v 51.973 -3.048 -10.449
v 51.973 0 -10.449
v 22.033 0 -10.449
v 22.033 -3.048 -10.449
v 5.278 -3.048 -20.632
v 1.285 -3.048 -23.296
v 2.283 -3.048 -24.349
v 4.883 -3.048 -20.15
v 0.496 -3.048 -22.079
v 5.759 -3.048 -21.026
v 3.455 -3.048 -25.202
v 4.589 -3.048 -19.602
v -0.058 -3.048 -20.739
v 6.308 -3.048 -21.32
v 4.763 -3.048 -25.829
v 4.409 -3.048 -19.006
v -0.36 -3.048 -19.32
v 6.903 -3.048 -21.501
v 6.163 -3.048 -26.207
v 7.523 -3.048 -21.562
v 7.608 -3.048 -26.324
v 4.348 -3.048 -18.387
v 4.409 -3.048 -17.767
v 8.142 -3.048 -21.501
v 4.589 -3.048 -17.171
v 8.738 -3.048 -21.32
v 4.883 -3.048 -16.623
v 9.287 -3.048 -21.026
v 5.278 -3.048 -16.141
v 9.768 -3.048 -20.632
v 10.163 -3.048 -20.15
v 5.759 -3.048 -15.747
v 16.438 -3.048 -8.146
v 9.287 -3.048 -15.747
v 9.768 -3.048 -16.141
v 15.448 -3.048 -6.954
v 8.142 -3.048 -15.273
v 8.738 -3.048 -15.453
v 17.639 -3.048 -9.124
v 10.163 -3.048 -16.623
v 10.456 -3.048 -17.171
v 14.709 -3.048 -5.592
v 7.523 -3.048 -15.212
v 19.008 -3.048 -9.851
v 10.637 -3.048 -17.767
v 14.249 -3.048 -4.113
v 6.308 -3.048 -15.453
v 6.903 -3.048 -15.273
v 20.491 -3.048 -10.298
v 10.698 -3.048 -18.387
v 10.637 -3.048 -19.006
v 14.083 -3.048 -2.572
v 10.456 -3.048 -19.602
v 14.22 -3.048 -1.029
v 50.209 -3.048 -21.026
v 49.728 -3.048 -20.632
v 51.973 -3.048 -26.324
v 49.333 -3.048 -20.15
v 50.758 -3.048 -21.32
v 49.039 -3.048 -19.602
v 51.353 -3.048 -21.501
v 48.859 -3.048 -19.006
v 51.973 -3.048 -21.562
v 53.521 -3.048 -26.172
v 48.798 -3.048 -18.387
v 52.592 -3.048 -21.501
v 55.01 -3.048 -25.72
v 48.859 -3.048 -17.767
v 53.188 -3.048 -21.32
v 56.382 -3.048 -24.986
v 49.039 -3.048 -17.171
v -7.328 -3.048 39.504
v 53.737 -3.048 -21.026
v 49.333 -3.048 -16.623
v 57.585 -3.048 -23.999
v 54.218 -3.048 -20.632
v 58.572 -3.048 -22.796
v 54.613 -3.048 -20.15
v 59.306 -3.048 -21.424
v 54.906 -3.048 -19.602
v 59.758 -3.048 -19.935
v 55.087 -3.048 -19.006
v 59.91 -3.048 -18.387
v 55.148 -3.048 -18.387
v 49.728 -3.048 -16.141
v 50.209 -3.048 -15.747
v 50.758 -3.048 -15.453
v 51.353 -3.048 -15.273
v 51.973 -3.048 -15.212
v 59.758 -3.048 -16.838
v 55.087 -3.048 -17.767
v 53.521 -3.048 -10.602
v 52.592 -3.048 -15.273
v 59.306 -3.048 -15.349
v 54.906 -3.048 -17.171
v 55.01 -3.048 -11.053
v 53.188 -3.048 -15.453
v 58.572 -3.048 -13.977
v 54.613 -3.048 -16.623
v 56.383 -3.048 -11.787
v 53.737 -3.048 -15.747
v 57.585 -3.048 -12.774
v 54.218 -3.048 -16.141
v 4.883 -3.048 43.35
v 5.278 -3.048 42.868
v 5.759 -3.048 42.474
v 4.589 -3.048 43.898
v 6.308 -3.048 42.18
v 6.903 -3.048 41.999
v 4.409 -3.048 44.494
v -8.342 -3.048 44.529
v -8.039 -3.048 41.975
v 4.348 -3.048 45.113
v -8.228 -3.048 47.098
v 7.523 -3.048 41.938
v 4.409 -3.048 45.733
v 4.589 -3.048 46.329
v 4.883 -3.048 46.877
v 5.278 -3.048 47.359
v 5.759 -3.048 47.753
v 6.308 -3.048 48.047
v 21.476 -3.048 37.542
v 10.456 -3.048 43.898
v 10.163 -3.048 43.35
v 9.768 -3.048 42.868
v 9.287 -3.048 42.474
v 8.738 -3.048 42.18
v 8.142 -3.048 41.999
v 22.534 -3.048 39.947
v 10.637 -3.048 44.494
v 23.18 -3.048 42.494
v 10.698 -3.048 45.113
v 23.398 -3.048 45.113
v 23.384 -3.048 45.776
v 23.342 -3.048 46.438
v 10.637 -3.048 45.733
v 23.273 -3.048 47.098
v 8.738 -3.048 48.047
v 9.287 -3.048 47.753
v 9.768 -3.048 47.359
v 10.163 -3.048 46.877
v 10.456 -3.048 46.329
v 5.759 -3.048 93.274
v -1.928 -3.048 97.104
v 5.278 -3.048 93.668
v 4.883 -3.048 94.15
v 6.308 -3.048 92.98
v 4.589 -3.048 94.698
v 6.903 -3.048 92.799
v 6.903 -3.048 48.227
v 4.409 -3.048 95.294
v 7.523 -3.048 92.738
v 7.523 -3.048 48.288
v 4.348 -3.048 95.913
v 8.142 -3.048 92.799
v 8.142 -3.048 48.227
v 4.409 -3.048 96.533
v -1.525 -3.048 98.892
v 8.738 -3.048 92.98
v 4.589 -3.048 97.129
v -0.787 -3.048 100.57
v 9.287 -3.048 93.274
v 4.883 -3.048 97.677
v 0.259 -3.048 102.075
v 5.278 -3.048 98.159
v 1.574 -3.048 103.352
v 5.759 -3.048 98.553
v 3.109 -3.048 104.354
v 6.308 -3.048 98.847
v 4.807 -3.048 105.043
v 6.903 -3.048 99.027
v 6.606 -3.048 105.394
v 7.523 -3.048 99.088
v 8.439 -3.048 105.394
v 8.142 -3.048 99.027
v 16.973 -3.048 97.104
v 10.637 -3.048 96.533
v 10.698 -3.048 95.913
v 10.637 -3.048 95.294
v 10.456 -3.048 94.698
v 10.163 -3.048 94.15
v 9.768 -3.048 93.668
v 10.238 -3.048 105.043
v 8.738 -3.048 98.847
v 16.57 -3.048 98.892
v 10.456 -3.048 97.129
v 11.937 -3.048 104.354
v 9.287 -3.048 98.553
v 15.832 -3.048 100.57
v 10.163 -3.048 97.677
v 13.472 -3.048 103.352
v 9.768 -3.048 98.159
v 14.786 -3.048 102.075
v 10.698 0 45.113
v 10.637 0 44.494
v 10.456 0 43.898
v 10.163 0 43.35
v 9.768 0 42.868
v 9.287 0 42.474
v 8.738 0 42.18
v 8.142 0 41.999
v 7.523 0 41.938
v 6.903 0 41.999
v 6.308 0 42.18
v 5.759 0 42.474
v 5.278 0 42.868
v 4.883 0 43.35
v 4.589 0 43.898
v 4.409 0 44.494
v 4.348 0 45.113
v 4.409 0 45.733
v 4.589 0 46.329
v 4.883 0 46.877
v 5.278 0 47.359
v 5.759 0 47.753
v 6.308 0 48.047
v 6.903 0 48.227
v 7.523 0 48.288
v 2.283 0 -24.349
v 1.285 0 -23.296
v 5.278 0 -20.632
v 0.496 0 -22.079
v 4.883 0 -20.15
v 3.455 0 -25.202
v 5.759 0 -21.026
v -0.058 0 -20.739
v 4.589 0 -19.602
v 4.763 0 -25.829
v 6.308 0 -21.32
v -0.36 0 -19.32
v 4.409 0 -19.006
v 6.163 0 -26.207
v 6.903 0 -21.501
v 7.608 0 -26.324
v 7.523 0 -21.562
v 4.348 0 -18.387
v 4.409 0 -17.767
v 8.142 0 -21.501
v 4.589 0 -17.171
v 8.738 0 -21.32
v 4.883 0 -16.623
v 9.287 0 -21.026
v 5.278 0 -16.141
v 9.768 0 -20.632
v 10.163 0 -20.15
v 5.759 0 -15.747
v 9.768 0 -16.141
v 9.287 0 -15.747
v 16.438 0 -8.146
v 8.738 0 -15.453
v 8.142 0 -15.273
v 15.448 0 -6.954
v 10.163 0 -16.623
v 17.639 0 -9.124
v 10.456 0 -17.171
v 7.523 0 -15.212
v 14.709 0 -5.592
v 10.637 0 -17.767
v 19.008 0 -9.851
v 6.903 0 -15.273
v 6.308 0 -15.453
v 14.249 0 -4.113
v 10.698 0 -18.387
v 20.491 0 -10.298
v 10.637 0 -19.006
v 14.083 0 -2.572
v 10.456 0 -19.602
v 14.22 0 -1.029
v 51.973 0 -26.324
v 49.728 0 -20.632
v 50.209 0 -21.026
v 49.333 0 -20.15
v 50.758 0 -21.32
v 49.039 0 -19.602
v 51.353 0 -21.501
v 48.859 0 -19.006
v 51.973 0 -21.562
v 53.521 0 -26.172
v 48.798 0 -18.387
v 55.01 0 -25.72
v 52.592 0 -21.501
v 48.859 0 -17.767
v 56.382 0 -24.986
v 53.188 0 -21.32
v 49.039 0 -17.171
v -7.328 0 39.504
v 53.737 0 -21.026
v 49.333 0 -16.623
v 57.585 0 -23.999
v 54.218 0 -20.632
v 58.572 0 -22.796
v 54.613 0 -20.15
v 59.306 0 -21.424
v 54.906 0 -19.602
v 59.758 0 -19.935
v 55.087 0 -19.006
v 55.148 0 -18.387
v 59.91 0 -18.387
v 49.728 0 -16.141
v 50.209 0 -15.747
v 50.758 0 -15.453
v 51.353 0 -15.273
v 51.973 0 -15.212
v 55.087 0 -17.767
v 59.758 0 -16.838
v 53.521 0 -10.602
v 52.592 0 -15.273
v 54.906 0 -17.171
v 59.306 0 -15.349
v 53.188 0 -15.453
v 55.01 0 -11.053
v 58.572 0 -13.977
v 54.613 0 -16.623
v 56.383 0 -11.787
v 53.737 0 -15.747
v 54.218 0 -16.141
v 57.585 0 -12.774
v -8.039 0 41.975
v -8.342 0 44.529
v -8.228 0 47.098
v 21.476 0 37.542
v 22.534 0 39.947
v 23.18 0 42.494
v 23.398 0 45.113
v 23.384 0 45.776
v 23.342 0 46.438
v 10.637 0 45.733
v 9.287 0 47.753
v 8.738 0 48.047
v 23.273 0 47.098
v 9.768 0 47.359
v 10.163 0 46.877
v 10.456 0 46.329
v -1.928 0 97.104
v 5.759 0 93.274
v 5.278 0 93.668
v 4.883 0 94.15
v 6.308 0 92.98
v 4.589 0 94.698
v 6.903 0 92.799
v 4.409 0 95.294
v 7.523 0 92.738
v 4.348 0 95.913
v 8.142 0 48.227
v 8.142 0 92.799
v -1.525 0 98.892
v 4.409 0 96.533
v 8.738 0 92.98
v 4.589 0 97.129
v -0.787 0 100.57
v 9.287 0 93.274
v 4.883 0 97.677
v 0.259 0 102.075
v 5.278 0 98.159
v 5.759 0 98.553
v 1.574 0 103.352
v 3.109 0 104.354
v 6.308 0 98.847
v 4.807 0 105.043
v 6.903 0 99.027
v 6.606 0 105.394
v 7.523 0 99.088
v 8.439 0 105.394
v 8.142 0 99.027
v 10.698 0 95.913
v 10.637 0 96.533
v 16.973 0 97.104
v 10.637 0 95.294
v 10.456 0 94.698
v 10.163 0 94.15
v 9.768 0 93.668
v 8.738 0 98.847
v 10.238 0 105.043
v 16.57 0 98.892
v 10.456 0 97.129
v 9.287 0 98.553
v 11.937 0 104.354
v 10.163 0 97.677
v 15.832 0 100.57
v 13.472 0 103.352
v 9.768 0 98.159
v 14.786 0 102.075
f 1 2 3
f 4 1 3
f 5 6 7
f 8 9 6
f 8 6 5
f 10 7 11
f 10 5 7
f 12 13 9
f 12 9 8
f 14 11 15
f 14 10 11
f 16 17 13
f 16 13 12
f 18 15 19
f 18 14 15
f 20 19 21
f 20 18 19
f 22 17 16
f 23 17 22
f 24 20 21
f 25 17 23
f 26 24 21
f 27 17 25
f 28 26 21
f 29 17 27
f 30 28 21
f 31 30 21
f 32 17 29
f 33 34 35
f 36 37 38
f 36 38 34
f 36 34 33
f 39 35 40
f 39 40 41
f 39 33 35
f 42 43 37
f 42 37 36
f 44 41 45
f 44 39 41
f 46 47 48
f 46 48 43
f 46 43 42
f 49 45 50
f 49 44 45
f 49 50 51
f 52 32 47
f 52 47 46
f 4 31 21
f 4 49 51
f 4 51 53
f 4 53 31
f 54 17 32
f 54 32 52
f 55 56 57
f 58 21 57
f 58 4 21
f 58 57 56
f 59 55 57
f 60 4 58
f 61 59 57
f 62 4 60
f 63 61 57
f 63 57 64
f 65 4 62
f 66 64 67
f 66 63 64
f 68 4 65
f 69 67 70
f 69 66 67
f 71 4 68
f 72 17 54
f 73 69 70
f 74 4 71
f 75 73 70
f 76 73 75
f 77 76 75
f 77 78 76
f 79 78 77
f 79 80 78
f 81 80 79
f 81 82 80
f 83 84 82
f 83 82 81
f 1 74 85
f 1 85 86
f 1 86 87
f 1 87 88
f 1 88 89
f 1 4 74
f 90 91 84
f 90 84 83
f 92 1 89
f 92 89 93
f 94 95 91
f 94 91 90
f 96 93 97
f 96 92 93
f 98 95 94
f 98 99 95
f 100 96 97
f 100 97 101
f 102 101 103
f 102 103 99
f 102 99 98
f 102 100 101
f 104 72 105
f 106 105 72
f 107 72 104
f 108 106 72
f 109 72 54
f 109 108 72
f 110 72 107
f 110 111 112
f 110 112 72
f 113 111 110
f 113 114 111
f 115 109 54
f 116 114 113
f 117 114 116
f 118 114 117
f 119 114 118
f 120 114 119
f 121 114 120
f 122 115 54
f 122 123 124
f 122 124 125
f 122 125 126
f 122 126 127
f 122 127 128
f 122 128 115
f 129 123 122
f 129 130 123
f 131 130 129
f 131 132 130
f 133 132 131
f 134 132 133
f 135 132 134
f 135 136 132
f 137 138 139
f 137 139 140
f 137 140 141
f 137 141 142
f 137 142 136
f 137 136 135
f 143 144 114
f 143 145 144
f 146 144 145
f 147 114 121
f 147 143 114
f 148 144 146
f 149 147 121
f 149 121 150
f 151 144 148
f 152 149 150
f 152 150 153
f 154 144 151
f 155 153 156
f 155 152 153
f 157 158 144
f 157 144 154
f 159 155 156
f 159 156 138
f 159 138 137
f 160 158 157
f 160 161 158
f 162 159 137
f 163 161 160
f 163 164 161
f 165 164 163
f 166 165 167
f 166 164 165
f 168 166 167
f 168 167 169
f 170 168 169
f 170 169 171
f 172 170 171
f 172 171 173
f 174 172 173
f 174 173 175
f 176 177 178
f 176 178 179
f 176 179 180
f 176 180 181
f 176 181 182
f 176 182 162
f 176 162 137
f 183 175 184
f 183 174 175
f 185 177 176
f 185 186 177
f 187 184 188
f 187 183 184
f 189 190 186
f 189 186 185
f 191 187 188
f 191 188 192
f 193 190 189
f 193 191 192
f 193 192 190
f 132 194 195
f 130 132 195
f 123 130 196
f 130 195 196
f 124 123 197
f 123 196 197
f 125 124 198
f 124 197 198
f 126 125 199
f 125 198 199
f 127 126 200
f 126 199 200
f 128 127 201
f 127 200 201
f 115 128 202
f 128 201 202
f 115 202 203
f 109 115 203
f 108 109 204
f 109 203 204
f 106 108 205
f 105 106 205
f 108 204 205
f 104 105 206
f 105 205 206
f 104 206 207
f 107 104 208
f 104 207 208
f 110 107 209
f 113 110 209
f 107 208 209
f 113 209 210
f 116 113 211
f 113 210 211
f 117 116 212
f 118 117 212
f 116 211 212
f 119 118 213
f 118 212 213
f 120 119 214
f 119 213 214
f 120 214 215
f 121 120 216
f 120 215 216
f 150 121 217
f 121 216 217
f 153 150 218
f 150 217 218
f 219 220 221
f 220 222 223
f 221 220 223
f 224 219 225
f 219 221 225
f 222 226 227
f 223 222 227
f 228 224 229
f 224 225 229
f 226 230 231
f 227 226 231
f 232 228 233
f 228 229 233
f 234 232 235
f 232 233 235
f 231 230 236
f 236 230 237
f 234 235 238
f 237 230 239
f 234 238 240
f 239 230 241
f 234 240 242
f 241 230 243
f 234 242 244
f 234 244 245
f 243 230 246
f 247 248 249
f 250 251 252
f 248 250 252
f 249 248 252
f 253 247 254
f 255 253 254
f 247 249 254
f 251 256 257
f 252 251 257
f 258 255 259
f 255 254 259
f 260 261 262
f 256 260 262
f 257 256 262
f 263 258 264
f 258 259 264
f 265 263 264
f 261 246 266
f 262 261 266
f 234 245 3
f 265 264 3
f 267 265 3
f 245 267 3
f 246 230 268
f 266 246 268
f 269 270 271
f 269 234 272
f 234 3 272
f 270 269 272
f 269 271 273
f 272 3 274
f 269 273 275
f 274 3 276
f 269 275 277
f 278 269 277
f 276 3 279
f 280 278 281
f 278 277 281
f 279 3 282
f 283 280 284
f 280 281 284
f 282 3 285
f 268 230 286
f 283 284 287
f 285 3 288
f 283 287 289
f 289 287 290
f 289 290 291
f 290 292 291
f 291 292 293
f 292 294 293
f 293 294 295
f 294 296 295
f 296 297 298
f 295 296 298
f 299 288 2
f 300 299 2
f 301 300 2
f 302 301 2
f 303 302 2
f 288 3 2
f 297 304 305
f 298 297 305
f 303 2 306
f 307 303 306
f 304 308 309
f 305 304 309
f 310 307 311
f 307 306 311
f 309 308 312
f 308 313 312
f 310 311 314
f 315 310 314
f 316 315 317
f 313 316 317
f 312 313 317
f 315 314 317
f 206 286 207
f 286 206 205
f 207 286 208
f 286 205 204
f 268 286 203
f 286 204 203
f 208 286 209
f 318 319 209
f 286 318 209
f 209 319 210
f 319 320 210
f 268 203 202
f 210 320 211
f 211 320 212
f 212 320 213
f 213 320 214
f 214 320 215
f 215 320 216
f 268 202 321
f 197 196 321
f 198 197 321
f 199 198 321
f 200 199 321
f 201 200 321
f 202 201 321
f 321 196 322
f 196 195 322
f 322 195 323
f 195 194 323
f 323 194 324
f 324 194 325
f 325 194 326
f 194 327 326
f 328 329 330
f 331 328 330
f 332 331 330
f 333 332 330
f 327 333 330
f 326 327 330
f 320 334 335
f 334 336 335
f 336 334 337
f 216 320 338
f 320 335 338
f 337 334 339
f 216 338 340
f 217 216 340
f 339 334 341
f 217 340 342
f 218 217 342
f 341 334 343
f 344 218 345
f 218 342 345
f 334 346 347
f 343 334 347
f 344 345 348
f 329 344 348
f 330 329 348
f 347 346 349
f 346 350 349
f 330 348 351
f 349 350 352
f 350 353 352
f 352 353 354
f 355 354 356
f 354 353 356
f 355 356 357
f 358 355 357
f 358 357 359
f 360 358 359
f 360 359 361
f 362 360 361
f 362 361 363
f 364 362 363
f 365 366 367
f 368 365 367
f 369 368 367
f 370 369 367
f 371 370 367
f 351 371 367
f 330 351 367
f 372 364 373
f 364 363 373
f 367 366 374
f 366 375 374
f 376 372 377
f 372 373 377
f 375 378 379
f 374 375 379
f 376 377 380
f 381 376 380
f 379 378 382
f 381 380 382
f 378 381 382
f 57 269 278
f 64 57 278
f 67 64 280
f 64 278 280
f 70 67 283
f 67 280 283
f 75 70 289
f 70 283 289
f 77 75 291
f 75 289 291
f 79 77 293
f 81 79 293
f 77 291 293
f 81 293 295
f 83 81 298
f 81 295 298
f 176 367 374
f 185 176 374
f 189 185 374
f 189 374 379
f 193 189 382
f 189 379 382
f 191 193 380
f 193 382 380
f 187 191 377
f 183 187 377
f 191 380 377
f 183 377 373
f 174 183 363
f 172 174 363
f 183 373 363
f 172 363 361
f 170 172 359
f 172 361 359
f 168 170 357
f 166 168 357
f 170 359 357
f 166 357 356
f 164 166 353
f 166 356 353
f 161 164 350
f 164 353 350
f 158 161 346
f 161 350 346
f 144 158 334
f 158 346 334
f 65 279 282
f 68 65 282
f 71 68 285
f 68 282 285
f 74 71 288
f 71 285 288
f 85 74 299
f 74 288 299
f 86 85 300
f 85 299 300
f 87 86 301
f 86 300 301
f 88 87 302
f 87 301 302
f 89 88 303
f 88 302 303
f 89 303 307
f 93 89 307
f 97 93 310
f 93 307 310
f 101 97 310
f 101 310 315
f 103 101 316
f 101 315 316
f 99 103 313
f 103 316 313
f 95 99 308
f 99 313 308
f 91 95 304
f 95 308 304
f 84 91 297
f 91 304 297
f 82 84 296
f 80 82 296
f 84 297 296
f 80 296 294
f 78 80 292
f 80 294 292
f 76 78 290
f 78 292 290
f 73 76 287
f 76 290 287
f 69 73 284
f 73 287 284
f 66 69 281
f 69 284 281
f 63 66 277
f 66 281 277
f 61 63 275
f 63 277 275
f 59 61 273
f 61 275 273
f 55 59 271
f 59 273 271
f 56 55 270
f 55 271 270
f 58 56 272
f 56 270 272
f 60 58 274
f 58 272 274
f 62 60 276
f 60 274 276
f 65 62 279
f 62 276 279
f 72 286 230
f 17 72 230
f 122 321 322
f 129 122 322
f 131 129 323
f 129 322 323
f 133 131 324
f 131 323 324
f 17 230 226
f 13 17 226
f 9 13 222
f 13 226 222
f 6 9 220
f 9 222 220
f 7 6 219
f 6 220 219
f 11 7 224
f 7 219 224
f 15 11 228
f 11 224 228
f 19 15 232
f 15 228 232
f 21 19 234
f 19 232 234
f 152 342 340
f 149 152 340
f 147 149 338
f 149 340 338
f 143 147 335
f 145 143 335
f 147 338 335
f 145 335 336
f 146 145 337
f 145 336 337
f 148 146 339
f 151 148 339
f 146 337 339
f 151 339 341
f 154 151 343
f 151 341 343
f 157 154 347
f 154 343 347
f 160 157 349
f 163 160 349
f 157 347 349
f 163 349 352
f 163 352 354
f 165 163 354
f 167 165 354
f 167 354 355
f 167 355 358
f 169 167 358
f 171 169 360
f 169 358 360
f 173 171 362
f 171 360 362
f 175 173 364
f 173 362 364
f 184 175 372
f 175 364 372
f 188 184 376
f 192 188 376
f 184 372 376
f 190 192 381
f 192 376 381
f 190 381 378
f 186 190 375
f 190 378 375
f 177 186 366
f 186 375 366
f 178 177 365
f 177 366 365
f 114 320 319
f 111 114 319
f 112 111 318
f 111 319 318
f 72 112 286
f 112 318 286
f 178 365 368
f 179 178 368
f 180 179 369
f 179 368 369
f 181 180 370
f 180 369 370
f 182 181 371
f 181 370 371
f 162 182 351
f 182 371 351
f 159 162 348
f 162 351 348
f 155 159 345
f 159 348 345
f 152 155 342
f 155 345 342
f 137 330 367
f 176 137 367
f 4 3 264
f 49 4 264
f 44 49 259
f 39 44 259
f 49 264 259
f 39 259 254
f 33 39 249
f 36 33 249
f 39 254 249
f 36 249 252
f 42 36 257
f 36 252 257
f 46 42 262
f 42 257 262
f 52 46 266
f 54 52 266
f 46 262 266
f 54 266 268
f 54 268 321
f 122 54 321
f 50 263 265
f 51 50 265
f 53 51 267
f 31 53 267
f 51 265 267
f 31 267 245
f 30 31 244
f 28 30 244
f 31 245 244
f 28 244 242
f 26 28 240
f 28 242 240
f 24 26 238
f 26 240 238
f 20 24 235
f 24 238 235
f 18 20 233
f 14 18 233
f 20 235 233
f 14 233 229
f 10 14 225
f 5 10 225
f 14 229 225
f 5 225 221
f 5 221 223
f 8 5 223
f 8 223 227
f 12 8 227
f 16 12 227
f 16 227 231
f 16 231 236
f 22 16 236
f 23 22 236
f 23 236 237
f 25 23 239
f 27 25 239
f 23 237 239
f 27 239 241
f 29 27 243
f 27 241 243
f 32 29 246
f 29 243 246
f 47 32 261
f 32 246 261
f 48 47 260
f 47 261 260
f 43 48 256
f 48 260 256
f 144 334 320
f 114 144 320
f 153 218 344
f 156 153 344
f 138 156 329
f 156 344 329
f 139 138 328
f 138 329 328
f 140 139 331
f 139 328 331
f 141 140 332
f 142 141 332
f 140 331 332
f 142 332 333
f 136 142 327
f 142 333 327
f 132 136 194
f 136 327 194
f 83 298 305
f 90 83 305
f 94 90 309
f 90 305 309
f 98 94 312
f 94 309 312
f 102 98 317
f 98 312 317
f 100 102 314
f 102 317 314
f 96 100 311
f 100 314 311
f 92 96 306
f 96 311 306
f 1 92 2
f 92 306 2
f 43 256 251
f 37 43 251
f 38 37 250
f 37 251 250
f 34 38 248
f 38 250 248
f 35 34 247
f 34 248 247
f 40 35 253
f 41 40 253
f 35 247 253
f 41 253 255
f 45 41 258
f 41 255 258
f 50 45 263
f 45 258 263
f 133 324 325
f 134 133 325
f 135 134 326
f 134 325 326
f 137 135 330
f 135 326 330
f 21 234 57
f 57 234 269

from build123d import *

# Parameters (mm, degrees)
F1_DEPTH = 3.048


with BuildPart() as f1:
    # F0 (on Front) → F1 (new body)
    with BuildSketch(Plane.XZ):
        with BuildLine():
            ThreePointArc((7.5227019244, -10.4490181237), (1.5890806412, -13.1143226875), (-0.3596819621, -19.3202903209))
            ThreePointArc((-0.3596819621, -19.3202903209), (2.2826274956, -24.3485250199), (7.6084325525, -26.3235551344))
            ThreePointArc((7.6084325525, -26.3235551344), (13.16559095, -23.9687855568), (15.4602019244, -18.3865181237))
            Line((15.4602019244, -18.3865181237), (10.6977019244, -18.3865181237))
            ThreePointArc((10.6977019244, -18.3865181237), (5.2776378942, -20.631582154), (7.5227019244, -15.2115181237))
            Line((7.5227019244, -15.2115181237), (7.5227019244, -10.4490181237))
        make_face()
        with BuildLine():
            Line((14.2200019541, -1.0290787363), (21.4755552782, 37.5415925289))
            ThreePointArc((21.4755552782, 37.5415925289), (15.6409493218, 31.4712795543), (7.5227019244, 29.2384818763))
            Line((7.5227019244, 29.2384818763), (7.5227019244, -10.4490181237))
            ThreePointArc((7.5227019244, -10.4490181237), (13.1353620001, -12.7738580481), (15.4602019244, -18.3865181237))
            Line((15.4602019244, -18.3865181237), (44.0352019244, -18.3865181237))
            ThreePointArc((44.0352019244, -18.3865181237), (46.3600418488, -12.7738580481), (51.9727019244, -10.4490181237))
            Line((51.9727019244, -10.4490181237), (22.0331668809, -10.4490181237))
            ThreePointArc((22.0331668809, -10.4490181237), (15.9139184745, -7.5742963259), (14.2200019541, -1.0290787363))
        make_face()
        with BuildLine():
            ThreePointArc((-1.9275910398, 97.1041068763), (0.3789519244, 89.6132865668), (7.5227019244, 86.3884818763))
            ThreePointArc((7.5227019244, 86.3884818763), (14.2578940152, 89.1782897855), (17.0477019244, 95.9134818763))
            ThreePointArc((17.0477019244, 95.9134818763), (17.0290068187, 96.5099651182), (16.9729948886, 97.1041068763))
            ThreePointArc((16.9729948886, 97.1041068763), (7.5227019244, 105.4384818763), (-1.9275910398, 97.1041068763))
        make_face()
        with BuildLine():
            ThreePointArc((10.6977019244, 95.9134818763), (9.7677659547, 93.668417846), (7.5227019244, 92.7384818763))
            ThreePointArc((7.5227019244, 92.7384818763), (5.2776378942, 98.1585459065), (10.6977019244, 95.9134818763))
        make_face(mode=Mode.SUBTRACT)
        with BuildLine():
            ThreePointArc((59.9102019244, -18.3865181237), (57.5853620001, -12.7738580481), (51.9727019244, -10.4490181237))
            ThreePointArc((51.9727019244, -10.4490181237), (46.3600418488, -12.7738580481), (44.0352019244, -18.3865181237))
            ThreePointArc((44.0352019244, -18.3865181237), (46.3600125617, -23.9991489122), (51.9726190879, -26.3240181233))
            ThreePointArc((51.9726190879, -26.3240181233), (57.5853327129, -23.9992074864), (59.9102019244, -18.3865181237))
        make_face()
        with BuildLine():
            ThreePointArc((55.1477019244, -18.3865181237), (51.9727019244, -21.5615181237), (48.7977019244, -18.3865181237))
            ThreePointArc((48.7977019244, -18.3865181237), (51.9727019244, -15.2115181237), (55.1477019244, -18.3865181237))
        make_face(mode=Mode.SUBTRACT)
        with BuildLine():
            ThreePointArc((23.2731901981, 47.0978568763), (18.0230274402, 57.0197318763), (7.5227019244, 60.9884818763))
            Line((7.5227019244, 60.9884818763), (7.5227019244, 48.2884818763))
            ThreePointArc((7.5227019244, 48.2884818763), (9.7677659547, 47.3585459065), (10.6977019244, 45.1134818763))
            ThreePointArc((10.6977019244, 45.1134818763), (9.7677659547, 42.868417846), (7.5227019244, 41.9384818763))
            Line((7.5227019244, 41.9384818763), (7.5227019244, 29.2384818763))
            ThreePointArc((7.5227019244, 29.2384818763), (15.6409493218, 31.4712795543), (21.4755552782, 37.5415925289))
            Line((21.4755552782, 37.5415925289), (23.2731901981, 47.0978568763))
        make_face()
        with BuildLine():
            ThreePointArc((23.3977019244, 45.1134818763), (23.3665434148, 46.1076206129), (23.2731901981, 47.0978568763))
            Line((23.2731901981, 47.0978568763), (21.4755552782, 37.5415925289))
            ThreePointArc((21.4755552782, 37.5415925289), (22.9096634827, 41.2074558901), (23.3977019244, 45.1134818763))
        make_face()
        with BuildLine():
            ThreePointArc((17.0477019244, 95.9134818763), (14.2578940152, 89.1782897855), (7.5227019244, 86.3884818763))
            Line((7.5227019244, 86.3884818763), (7.5227019244, 60.9884818763))
            ThreePointArc((7.5227019244, 60.9884818763), (18.0230274402, 57.0197318763), (23.2731901981, 47.0978568763))
            Line((23.2731901981, 47.0978568763), (16.9729948886, 97.1041068763))
            ThreePointArc((16.9729948886, 97.1041068763), (17.0290068187, 96.5099651182), (17.0477019244, 95.9134818763))
        make_face()
        with BuildLine():
            ThreePointArc((15.4602019244, -18.3865181237), (13.1353620001, -12.7738580481), (7.5227019244, -10.4490181237))
            Line((7.5227019244, -10.4490181237), (7.5227019244, -15.2115181237))
            ThreePointArc((7.5227019244, -15.2115181237), (9.7677659547, -16.1414540935), (10.6977019244, -18.3865181237))
            Line((10.6977019244, -18.3865181237), (15.4602019244, -18.3865181237))
        make_face()
        with BuildLine():
            ThreePointArc((15.4602019244, -18.3865181237), (13.16559095, -23.9687855568), (7.6084325525, -26.3235551344))
            Line((7.6084325525, -26.3235551344), (51.9726190879, -26.3240181233))
            ThreePointArc((51.9726190879, -26.3240181233), (46.3600125617, -23.9991489122), (44.0352019244, -18.3865181237))
            Line((44.0352019244, -18.3865181237), (15.4602019244, -18.3865181237))
        make_face()
        with BuildLine():
            Line((7.5227019244, 48.2884818763), (7.5227019244, 60.9884818763))
            ThreePointArc((7.5227019244, 60.9884818763), (-2.9776235914, 57.0197318763), (-8.2277863493, 47.0978568763))
            Line((-8.2277863493, 47.0978568763), (-7.3281904539, 39.5039702604))
            ThreePointArc((-7.3281904539, 39.5039702604), (-1.5040535308, 32.0546415391), (7.5227019244, 29.2384818763))
            Line((7.5227019244, 29.2384818763), (7.5227019244, 41.9384818763))
            ThreePointArc((7.5227019244, 41.9384818763), (4.3477019244, 45.1134818763), (7.5227019244, 48.2884818763))
        make_face()
        with BuildLine():
            Line((7.5227019244, 60.9884818763), (7.5227019244, 86.3884818763))
            ThreePointArc((7.5227019244, 86.3884818763), (0.3789519244, 89.6132865668), (-1.9275910398, 97.1041068763))
            Line((-1.9275910398, 97.1041068763), (-8.2277863493, 47.0978568763))
            ThreePointArc((-8.2277863493, 47.0978568763), (-2.9776235914, 57.0197318763), (7.5227019244, 60.9884818763))
        make_face()
        with BuildLine():
            ThreePointArc((7.5227019244, 29.2384818763), (-1.5040535308, 32.0546415391), (-7.3281904539, 39.5039702604))
            Line((-7.3281904539, 39.5039702604), (-0.3596819621, -19.3202903209))
            ThreePointArc((-0.3596819621, -19.3202903209), (1.5890806412, -13.1143226875), (7.5227019244, -10.4490181237))
            Line((7.5227019244, -10.4490181237), (7.5227019244, 29.2384818763))
        make_face()
        with BuildLine():
            Line((-7.3281904539, 39.5039702604), (-8.2277863493, 47.0978568763))
            ThreePointArc((-8.2277863493, 47.0978568763), (-8.2420658485, 43.245937482), (-7.3281904539, 39.5039702604))
        make_face()
    extrude(amount=F1_DEPTH)


solid = f1.part
